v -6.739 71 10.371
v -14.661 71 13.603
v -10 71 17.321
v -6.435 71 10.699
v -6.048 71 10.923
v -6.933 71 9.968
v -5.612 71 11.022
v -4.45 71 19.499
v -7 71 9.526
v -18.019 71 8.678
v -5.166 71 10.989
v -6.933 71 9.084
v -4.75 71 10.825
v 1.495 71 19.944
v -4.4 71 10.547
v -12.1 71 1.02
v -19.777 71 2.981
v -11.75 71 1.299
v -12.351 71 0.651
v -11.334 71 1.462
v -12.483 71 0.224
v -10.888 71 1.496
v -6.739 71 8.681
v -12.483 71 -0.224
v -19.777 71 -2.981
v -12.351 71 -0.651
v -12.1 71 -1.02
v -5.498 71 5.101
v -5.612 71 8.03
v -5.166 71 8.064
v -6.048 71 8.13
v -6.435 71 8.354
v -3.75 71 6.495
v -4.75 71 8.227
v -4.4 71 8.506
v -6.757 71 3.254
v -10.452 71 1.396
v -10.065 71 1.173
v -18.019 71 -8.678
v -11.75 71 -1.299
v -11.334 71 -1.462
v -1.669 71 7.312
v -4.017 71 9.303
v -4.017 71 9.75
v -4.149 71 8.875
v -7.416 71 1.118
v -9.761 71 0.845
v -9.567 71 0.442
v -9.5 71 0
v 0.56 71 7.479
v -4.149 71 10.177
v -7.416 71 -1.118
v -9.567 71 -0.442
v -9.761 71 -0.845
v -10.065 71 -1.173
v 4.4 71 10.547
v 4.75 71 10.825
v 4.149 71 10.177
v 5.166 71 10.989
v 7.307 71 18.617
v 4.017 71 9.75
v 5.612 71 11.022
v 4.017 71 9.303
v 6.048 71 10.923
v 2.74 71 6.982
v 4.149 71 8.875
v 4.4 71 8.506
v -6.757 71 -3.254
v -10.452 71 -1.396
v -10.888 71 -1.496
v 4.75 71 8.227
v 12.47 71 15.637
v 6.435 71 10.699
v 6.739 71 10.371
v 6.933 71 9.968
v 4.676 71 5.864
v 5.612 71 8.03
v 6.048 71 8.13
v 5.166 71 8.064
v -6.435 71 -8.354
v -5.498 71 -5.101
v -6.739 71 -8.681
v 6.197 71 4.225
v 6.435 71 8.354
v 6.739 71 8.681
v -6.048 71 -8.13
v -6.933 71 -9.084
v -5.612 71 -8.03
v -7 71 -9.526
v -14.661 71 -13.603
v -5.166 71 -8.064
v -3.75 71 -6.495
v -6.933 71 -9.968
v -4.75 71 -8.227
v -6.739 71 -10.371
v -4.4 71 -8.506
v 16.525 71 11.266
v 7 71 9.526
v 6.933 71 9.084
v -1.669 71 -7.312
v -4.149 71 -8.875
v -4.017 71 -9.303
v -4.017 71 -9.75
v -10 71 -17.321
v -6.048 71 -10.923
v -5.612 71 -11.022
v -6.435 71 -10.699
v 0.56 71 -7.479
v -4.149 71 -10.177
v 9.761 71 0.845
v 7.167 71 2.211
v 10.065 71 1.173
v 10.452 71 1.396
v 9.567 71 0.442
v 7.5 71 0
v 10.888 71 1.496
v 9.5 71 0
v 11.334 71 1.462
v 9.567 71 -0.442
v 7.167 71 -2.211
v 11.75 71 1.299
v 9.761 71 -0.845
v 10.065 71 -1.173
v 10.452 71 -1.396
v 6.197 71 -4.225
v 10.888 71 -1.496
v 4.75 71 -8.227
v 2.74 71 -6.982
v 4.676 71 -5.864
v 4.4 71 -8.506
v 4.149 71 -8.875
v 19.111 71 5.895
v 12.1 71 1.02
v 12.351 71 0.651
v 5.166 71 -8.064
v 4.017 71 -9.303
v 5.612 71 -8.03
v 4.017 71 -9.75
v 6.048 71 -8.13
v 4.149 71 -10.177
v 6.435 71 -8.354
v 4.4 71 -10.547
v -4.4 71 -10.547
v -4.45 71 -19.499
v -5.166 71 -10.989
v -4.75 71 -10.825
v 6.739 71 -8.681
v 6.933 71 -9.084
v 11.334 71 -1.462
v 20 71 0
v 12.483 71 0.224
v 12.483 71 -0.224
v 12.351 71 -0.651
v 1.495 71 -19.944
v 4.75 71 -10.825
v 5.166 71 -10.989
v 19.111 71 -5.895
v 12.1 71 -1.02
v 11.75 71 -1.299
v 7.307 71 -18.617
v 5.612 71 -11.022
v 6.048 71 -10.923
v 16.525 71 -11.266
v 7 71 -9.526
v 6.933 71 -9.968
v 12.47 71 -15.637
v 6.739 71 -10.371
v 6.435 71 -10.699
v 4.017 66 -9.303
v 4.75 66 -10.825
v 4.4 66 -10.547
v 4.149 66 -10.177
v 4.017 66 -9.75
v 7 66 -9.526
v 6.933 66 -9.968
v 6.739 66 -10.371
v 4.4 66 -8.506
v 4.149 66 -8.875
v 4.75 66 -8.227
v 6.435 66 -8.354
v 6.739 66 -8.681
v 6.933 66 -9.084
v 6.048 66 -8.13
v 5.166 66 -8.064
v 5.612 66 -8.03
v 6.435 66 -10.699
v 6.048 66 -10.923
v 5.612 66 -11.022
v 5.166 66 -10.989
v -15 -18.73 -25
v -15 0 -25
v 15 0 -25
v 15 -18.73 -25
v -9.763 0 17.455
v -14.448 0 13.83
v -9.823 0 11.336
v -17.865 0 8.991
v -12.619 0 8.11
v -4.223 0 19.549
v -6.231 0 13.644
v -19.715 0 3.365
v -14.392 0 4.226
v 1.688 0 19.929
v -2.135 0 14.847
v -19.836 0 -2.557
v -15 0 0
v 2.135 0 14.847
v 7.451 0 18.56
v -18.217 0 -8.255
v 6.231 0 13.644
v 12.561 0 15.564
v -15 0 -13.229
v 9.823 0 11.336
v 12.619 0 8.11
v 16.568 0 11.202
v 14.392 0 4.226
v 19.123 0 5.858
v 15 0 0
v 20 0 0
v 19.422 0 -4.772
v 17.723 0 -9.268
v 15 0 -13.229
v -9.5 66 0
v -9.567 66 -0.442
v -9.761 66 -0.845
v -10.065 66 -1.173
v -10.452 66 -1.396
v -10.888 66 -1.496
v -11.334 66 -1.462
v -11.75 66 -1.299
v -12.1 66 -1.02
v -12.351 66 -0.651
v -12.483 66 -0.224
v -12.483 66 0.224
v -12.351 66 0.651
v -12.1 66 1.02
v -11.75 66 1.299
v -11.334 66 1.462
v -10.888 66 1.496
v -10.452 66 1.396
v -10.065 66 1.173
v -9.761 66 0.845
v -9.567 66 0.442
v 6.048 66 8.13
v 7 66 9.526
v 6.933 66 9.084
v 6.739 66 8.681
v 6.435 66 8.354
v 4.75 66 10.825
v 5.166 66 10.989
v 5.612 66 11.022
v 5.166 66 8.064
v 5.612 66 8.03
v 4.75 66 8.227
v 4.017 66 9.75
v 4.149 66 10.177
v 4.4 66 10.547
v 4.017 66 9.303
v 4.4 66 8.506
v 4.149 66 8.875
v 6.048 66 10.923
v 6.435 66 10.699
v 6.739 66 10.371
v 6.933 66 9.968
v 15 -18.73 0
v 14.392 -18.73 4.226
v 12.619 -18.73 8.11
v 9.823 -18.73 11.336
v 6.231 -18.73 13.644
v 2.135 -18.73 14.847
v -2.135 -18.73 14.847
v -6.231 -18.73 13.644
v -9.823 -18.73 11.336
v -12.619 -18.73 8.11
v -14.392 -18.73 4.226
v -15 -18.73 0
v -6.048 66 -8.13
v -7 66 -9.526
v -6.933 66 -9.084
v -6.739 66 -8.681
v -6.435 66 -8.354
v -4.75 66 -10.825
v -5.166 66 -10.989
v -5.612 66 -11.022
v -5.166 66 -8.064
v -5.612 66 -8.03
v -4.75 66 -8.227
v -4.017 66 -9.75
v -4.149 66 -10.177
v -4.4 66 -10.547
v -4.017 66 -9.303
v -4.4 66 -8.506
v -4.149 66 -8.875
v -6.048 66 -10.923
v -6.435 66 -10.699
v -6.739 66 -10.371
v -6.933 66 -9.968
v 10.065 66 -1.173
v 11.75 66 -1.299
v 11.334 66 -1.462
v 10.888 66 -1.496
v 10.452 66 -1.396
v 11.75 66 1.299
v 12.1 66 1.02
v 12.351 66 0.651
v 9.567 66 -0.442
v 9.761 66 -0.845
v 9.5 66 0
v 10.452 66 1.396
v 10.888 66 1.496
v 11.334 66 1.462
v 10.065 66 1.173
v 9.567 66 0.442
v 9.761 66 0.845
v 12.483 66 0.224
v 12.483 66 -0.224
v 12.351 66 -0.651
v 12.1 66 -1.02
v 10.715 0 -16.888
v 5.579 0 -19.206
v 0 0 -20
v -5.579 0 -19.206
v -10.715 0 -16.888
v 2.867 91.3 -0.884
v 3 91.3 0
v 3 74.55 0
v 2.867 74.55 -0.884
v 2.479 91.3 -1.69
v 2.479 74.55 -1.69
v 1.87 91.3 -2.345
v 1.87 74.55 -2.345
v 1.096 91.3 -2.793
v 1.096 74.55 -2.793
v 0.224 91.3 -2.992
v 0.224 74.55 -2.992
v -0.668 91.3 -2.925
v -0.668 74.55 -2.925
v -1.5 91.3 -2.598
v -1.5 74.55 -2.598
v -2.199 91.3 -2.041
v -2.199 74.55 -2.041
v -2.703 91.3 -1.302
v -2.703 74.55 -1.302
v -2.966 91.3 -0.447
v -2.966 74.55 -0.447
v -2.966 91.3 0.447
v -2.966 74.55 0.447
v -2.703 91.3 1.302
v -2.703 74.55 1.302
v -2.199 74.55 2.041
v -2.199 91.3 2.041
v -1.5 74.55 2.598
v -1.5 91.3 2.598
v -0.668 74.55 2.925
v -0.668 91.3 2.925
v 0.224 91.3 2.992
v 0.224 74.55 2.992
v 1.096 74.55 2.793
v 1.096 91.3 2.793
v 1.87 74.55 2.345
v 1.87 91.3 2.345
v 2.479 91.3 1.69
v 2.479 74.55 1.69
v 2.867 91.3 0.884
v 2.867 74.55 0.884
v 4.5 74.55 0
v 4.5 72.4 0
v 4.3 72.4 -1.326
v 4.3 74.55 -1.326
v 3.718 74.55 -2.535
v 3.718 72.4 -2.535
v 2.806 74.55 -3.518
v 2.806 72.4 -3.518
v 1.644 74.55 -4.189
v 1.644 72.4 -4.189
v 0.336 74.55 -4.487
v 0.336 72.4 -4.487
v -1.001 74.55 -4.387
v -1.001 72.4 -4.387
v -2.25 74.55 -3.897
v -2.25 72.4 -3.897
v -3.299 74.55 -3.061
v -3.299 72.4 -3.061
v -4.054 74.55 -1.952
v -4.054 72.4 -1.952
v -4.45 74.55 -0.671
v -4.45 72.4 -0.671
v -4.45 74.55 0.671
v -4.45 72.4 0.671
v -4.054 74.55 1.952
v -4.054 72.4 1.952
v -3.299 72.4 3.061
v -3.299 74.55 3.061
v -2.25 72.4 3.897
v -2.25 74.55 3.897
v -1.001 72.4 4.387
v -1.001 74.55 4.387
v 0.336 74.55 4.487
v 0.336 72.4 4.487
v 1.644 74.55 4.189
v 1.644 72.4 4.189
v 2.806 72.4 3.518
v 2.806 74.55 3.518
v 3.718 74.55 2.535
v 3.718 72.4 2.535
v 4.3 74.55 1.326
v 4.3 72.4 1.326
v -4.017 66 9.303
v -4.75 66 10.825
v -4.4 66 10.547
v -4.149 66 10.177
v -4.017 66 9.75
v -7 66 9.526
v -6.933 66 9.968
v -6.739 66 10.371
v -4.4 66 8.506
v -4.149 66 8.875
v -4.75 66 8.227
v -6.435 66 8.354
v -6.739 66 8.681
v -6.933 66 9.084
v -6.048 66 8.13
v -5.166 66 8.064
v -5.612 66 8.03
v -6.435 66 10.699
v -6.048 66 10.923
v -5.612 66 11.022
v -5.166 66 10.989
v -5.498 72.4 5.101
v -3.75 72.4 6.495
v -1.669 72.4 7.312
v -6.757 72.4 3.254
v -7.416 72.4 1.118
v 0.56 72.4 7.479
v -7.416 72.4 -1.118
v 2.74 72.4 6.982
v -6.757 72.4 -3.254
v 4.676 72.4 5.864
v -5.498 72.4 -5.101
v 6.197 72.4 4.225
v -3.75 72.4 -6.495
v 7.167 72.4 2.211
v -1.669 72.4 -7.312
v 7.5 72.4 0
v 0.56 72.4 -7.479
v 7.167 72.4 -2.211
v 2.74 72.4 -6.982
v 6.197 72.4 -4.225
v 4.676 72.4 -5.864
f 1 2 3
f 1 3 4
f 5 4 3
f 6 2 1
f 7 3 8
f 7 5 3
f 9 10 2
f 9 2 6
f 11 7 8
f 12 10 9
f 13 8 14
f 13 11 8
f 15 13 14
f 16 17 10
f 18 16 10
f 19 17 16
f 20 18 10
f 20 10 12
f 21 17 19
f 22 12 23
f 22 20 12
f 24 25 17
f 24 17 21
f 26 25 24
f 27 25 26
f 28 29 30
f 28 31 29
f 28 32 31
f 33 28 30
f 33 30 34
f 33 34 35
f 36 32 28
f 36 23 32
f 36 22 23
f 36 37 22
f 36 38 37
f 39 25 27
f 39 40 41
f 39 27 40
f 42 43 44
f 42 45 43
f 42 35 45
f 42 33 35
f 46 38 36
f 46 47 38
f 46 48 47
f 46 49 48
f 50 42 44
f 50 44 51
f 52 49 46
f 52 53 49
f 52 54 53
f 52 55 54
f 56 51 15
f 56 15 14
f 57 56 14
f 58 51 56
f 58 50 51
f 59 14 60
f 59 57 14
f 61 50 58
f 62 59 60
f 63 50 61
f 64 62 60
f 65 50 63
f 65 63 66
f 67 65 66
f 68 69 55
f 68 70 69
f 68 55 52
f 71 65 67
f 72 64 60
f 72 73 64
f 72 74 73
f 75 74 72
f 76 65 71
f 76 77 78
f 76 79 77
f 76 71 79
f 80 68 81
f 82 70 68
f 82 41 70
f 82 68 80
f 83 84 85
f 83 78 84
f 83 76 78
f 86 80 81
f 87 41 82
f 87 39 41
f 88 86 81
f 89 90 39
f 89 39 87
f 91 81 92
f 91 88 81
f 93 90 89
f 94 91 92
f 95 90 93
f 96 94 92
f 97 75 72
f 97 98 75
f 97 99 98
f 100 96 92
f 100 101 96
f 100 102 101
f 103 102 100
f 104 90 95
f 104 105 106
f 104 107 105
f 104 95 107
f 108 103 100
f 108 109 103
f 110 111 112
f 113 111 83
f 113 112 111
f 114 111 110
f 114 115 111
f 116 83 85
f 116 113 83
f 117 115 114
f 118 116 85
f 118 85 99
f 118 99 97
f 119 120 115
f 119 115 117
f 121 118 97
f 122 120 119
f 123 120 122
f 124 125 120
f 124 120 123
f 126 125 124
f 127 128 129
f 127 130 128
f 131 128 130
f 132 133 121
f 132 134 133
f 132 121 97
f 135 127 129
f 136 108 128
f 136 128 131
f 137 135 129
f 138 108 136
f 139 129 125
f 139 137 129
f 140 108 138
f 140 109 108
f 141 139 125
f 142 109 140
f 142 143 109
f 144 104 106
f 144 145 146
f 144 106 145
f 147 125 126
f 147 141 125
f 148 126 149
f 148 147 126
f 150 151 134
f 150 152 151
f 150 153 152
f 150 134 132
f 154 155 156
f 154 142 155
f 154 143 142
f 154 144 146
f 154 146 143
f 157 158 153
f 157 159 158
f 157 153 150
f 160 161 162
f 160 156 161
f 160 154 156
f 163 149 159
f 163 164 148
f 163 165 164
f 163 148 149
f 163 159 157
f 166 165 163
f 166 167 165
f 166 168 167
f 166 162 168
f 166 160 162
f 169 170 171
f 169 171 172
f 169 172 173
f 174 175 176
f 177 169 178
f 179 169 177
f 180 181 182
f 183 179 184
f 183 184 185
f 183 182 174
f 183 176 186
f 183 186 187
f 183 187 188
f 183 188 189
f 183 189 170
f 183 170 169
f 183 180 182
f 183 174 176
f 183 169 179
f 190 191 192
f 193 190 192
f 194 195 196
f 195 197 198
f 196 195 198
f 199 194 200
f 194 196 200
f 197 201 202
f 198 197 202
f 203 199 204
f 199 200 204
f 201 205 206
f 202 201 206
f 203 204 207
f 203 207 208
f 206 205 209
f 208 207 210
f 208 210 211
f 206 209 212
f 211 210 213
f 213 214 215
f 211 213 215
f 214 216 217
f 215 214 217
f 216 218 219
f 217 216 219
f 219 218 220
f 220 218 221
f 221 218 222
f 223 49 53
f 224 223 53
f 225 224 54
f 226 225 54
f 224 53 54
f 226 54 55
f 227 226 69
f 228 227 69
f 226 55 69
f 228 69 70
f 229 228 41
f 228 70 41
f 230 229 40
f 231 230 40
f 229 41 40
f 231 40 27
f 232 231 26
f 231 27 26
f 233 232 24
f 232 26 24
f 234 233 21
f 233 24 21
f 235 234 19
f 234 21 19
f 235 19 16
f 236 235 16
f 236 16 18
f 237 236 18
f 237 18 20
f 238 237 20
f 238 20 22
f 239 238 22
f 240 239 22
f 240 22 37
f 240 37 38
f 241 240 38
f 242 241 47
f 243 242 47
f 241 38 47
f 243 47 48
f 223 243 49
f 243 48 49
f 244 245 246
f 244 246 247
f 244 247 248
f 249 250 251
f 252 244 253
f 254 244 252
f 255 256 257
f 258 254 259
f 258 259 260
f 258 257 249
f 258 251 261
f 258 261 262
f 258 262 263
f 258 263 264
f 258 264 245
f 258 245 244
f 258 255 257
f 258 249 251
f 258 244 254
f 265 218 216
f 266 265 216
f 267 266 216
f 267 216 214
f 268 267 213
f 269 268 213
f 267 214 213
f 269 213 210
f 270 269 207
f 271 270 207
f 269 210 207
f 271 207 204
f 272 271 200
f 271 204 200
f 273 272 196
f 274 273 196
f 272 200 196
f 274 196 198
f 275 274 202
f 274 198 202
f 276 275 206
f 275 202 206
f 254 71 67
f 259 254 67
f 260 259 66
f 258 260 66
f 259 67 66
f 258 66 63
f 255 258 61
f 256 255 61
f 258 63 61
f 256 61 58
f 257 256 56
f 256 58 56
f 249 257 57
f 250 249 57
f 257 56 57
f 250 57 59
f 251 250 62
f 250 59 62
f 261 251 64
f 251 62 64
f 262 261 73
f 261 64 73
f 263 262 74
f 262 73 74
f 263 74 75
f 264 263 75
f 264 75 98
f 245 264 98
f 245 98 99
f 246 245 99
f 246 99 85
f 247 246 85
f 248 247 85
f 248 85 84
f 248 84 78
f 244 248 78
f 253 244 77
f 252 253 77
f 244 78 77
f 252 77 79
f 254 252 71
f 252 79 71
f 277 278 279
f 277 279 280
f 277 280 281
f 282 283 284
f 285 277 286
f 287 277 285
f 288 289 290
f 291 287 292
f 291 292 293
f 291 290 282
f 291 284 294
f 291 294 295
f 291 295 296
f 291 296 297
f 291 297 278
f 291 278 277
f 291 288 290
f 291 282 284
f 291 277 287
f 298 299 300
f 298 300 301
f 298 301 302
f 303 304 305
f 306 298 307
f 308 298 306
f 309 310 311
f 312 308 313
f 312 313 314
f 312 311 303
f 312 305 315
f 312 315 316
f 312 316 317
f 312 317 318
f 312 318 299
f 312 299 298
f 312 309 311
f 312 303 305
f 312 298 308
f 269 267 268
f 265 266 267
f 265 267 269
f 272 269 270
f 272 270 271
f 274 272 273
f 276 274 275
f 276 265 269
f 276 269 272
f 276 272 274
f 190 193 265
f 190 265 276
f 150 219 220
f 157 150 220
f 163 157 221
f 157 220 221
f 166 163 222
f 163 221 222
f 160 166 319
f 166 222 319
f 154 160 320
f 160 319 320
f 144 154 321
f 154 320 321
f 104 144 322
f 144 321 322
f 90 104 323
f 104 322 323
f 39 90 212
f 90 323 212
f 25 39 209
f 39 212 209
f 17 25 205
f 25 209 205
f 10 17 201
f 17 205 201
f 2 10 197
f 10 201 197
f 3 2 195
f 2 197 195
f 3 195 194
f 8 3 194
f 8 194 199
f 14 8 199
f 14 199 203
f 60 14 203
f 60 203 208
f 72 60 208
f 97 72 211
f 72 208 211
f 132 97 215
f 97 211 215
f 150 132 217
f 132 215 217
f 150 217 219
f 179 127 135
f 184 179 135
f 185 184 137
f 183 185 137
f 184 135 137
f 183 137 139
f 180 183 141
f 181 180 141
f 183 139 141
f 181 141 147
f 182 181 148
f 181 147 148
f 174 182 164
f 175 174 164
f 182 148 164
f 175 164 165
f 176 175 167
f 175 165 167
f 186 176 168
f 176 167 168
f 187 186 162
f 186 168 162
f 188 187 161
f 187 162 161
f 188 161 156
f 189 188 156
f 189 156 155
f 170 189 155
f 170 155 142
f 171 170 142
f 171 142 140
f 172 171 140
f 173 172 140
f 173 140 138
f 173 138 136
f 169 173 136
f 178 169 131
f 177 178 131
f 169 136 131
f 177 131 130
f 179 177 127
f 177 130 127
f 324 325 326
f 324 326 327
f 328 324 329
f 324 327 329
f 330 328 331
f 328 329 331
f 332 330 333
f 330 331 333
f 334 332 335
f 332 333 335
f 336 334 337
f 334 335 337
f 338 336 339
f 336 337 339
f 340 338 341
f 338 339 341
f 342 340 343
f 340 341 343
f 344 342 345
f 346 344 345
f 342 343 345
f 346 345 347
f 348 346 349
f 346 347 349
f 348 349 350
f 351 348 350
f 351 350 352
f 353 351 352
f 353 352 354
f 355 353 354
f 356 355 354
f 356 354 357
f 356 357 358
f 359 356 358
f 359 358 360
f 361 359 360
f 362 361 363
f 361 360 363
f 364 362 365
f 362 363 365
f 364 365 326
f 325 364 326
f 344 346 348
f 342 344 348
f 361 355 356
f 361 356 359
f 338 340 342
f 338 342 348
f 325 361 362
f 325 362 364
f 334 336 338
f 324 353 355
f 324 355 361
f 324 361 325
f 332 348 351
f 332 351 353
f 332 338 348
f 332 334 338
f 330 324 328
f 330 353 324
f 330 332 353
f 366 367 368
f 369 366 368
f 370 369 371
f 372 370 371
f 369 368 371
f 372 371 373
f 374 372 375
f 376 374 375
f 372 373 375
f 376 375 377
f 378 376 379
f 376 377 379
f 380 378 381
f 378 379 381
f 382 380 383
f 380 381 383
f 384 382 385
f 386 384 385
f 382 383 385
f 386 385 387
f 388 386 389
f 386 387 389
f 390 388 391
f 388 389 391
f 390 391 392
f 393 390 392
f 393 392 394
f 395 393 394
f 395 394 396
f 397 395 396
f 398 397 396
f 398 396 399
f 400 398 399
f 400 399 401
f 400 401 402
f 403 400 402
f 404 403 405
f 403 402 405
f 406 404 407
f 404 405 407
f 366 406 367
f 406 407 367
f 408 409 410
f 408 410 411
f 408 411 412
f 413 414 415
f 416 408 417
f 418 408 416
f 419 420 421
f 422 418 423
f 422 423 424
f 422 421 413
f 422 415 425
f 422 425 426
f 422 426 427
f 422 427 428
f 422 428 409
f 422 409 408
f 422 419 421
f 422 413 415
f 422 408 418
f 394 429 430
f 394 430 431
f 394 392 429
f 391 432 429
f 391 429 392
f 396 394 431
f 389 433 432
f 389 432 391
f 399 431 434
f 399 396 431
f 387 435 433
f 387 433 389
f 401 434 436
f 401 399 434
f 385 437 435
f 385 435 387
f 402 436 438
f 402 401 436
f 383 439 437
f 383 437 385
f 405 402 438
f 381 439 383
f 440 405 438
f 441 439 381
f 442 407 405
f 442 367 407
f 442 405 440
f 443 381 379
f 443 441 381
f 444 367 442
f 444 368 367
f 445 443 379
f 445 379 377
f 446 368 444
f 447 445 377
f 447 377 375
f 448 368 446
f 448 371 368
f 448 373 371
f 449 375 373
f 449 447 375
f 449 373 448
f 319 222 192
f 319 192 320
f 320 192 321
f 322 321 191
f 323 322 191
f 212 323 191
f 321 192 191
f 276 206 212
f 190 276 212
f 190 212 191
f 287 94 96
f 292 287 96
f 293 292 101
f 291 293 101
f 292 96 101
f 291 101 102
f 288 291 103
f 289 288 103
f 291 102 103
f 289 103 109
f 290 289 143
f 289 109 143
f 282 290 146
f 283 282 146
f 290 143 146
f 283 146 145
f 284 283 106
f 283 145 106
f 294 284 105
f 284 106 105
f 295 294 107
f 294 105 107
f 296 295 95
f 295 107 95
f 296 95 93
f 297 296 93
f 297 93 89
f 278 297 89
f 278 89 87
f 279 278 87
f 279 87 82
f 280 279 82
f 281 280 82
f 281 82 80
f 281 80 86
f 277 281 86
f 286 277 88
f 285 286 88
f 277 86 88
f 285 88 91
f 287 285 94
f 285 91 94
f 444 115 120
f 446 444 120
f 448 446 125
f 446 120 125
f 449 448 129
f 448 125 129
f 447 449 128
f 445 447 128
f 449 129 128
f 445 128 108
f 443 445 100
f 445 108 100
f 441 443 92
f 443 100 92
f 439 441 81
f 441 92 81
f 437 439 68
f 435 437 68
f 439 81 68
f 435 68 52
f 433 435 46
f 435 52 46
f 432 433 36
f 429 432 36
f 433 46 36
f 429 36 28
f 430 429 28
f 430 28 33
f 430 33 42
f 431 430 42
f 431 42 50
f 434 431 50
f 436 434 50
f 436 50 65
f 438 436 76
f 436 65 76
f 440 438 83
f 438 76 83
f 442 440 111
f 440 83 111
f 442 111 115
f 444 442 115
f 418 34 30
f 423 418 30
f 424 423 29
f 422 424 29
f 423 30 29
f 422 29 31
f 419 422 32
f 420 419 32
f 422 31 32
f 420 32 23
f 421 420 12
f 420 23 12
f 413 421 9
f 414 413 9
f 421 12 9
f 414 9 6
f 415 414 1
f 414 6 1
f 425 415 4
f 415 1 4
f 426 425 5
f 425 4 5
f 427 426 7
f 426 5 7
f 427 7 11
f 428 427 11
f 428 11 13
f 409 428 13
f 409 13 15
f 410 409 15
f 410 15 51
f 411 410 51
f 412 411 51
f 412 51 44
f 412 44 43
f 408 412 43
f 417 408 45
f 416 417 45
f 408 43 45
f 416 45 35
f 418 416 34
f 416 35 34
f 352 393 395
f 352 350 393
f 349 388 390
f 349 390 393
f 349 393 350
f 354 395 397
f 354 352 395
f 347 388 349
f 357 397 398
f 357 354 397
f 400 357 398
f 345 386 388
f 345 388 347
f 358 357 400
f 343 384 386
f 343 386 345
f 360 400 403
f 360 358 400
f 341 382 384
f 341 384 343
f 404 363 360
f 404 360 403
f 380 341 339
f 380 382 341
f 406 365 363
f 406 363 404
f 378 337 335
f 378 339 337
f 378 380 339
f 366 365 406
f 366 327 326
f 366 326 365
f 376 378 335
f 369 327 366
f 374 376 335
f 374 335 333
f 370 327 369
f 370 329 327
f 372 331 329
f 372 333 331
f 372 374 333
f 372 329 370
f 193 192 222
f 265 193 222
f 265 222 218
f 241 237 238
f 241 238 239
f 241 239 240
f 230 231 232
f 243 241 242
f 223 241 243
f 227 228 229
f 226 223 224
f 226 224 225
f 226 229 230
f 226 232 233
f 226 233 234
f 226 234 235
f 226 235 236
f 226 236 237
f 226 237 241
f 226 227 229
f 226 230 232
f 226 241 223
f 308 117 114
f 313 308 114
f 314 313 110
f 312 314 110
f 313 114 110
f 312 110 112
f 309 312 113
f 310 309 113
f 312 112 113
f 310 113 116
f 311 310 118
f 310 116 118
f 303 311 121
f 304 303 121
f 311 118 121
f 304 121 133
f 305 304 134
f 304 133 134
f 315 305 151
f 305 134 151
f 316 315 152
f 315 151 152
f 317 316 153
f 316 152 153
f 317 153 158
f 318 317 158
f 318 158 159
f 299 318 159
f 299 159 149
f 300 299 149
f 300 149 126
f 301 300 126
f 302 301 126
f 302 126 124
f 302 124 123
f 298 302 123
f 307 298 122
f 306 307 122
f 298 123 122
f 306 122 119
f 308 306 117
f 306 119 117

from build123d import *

# Parameters (mm, degrees)
SKETCH1_R           = 20
BOSS_EXTRUDE1_DEPTH = 71
SKETCH2_R           = 7.5
BOSS_EXTRUDE2_DEPTH = 1.4
SKETCH3_R           = 4.5
BOSS_EXTRUDE3_DEPTH = 2.15
SKETCH4_R           = 3
BOSS_EXTRUDE4_DEPTH = 16.75
SKETCH5_R           = 1.5
CUT_EXTRUDE1_DEPTH  = 5
CIRPATTERN1_COUNT   = 6
BOSS_EXTRUDE5_DEPTH = 18.73


with BuildPart() as part:
    # Sketch1 → Boss-Extrude1 (new body)
    with BuildSketch(Plane(origin=(0, 0, 0), x_dir=(1, 0, 0), z_dir=(0, 1, 0))):
        Circle(SKETCH1_R)
    extrude(amount=BOSS_EXTRUDE1_DEPTH)

    # Sketch2 → Boss-Extrude2 (add)
    with BuildSketch(Plane(origin=(0, 71, 0), x_dir=(1, 0, 0), z_dir=(0, 1, 0))):
        Circle(SKETCH2_R)
    extrude(amount=BOSS_EXTRUDE2_DEPTH)

    # Sketch3 → Boss-Extrude3 (add)
    with BuildSketch(Plane(origin=(0, 72.4, 0), x_dir=(1, 0, 0), z_dir=(0, 1, 0))):
        Circle(SKETCH3_R)
    extrude(amount=BOSS_EXTRUDE3_DEPTH)

    # Sketch4 → Boss-Extrude4 (add)
    with BuildSketch(Plane(origin=(0, 74.55, 0), x_dir=(1, 0, 0), z_dir=(0, 1, 0))):
        Circle(SKETCH4_R)
    extrude(amount=BOSS_EXTRUDE4_DEPTH)

    # Sketch5 → Cut-Extrude1 (cut)
    with BuildSketch(Plane(origin=(0, 71, 0), x_dir=(1, 0, 0), z_dir=(0, 1, 0))):
        with Locations((-11, 0)):
            Circle(SKETCH5_R)
    cut_extrude1 = extrude(amount=-CUT_EXTRUDE1_DEPTH, mode=Mode.SUBTRACT)

    # CirPattern1: Cut-Extrude1 ×6 about axis
    cirpattern1_axis = Axis((0, 0, 0), (0, 1, 0))
    for i in range(1, CIRPATTERN1_COUNT):
        add(cut_extrude1.rotate(cirpattern1_axis, i * 360 / CIRPATTERN1_COUNT), mode=Mode.SUBTRACT)

    # Sketch6 → Boss-Extrude5 (add)
    with BuildSketch(Plane(origin=(0, 0, 0), x_dir=(-1, 0, 0), z_dir=(0, -1, 0))):
        with BuildLine():
            Line((15, 0), (15, 25))
            Line((15, 25), (-15, 25))
            Line((-15, 25), (-15, 0))
            ThreePointArc((-15, 0), (0, -15), (15, 0))
        make_face()
    extrude(amount=BOSS_EXTRUDE5_DEPTH)


solid = part.part
